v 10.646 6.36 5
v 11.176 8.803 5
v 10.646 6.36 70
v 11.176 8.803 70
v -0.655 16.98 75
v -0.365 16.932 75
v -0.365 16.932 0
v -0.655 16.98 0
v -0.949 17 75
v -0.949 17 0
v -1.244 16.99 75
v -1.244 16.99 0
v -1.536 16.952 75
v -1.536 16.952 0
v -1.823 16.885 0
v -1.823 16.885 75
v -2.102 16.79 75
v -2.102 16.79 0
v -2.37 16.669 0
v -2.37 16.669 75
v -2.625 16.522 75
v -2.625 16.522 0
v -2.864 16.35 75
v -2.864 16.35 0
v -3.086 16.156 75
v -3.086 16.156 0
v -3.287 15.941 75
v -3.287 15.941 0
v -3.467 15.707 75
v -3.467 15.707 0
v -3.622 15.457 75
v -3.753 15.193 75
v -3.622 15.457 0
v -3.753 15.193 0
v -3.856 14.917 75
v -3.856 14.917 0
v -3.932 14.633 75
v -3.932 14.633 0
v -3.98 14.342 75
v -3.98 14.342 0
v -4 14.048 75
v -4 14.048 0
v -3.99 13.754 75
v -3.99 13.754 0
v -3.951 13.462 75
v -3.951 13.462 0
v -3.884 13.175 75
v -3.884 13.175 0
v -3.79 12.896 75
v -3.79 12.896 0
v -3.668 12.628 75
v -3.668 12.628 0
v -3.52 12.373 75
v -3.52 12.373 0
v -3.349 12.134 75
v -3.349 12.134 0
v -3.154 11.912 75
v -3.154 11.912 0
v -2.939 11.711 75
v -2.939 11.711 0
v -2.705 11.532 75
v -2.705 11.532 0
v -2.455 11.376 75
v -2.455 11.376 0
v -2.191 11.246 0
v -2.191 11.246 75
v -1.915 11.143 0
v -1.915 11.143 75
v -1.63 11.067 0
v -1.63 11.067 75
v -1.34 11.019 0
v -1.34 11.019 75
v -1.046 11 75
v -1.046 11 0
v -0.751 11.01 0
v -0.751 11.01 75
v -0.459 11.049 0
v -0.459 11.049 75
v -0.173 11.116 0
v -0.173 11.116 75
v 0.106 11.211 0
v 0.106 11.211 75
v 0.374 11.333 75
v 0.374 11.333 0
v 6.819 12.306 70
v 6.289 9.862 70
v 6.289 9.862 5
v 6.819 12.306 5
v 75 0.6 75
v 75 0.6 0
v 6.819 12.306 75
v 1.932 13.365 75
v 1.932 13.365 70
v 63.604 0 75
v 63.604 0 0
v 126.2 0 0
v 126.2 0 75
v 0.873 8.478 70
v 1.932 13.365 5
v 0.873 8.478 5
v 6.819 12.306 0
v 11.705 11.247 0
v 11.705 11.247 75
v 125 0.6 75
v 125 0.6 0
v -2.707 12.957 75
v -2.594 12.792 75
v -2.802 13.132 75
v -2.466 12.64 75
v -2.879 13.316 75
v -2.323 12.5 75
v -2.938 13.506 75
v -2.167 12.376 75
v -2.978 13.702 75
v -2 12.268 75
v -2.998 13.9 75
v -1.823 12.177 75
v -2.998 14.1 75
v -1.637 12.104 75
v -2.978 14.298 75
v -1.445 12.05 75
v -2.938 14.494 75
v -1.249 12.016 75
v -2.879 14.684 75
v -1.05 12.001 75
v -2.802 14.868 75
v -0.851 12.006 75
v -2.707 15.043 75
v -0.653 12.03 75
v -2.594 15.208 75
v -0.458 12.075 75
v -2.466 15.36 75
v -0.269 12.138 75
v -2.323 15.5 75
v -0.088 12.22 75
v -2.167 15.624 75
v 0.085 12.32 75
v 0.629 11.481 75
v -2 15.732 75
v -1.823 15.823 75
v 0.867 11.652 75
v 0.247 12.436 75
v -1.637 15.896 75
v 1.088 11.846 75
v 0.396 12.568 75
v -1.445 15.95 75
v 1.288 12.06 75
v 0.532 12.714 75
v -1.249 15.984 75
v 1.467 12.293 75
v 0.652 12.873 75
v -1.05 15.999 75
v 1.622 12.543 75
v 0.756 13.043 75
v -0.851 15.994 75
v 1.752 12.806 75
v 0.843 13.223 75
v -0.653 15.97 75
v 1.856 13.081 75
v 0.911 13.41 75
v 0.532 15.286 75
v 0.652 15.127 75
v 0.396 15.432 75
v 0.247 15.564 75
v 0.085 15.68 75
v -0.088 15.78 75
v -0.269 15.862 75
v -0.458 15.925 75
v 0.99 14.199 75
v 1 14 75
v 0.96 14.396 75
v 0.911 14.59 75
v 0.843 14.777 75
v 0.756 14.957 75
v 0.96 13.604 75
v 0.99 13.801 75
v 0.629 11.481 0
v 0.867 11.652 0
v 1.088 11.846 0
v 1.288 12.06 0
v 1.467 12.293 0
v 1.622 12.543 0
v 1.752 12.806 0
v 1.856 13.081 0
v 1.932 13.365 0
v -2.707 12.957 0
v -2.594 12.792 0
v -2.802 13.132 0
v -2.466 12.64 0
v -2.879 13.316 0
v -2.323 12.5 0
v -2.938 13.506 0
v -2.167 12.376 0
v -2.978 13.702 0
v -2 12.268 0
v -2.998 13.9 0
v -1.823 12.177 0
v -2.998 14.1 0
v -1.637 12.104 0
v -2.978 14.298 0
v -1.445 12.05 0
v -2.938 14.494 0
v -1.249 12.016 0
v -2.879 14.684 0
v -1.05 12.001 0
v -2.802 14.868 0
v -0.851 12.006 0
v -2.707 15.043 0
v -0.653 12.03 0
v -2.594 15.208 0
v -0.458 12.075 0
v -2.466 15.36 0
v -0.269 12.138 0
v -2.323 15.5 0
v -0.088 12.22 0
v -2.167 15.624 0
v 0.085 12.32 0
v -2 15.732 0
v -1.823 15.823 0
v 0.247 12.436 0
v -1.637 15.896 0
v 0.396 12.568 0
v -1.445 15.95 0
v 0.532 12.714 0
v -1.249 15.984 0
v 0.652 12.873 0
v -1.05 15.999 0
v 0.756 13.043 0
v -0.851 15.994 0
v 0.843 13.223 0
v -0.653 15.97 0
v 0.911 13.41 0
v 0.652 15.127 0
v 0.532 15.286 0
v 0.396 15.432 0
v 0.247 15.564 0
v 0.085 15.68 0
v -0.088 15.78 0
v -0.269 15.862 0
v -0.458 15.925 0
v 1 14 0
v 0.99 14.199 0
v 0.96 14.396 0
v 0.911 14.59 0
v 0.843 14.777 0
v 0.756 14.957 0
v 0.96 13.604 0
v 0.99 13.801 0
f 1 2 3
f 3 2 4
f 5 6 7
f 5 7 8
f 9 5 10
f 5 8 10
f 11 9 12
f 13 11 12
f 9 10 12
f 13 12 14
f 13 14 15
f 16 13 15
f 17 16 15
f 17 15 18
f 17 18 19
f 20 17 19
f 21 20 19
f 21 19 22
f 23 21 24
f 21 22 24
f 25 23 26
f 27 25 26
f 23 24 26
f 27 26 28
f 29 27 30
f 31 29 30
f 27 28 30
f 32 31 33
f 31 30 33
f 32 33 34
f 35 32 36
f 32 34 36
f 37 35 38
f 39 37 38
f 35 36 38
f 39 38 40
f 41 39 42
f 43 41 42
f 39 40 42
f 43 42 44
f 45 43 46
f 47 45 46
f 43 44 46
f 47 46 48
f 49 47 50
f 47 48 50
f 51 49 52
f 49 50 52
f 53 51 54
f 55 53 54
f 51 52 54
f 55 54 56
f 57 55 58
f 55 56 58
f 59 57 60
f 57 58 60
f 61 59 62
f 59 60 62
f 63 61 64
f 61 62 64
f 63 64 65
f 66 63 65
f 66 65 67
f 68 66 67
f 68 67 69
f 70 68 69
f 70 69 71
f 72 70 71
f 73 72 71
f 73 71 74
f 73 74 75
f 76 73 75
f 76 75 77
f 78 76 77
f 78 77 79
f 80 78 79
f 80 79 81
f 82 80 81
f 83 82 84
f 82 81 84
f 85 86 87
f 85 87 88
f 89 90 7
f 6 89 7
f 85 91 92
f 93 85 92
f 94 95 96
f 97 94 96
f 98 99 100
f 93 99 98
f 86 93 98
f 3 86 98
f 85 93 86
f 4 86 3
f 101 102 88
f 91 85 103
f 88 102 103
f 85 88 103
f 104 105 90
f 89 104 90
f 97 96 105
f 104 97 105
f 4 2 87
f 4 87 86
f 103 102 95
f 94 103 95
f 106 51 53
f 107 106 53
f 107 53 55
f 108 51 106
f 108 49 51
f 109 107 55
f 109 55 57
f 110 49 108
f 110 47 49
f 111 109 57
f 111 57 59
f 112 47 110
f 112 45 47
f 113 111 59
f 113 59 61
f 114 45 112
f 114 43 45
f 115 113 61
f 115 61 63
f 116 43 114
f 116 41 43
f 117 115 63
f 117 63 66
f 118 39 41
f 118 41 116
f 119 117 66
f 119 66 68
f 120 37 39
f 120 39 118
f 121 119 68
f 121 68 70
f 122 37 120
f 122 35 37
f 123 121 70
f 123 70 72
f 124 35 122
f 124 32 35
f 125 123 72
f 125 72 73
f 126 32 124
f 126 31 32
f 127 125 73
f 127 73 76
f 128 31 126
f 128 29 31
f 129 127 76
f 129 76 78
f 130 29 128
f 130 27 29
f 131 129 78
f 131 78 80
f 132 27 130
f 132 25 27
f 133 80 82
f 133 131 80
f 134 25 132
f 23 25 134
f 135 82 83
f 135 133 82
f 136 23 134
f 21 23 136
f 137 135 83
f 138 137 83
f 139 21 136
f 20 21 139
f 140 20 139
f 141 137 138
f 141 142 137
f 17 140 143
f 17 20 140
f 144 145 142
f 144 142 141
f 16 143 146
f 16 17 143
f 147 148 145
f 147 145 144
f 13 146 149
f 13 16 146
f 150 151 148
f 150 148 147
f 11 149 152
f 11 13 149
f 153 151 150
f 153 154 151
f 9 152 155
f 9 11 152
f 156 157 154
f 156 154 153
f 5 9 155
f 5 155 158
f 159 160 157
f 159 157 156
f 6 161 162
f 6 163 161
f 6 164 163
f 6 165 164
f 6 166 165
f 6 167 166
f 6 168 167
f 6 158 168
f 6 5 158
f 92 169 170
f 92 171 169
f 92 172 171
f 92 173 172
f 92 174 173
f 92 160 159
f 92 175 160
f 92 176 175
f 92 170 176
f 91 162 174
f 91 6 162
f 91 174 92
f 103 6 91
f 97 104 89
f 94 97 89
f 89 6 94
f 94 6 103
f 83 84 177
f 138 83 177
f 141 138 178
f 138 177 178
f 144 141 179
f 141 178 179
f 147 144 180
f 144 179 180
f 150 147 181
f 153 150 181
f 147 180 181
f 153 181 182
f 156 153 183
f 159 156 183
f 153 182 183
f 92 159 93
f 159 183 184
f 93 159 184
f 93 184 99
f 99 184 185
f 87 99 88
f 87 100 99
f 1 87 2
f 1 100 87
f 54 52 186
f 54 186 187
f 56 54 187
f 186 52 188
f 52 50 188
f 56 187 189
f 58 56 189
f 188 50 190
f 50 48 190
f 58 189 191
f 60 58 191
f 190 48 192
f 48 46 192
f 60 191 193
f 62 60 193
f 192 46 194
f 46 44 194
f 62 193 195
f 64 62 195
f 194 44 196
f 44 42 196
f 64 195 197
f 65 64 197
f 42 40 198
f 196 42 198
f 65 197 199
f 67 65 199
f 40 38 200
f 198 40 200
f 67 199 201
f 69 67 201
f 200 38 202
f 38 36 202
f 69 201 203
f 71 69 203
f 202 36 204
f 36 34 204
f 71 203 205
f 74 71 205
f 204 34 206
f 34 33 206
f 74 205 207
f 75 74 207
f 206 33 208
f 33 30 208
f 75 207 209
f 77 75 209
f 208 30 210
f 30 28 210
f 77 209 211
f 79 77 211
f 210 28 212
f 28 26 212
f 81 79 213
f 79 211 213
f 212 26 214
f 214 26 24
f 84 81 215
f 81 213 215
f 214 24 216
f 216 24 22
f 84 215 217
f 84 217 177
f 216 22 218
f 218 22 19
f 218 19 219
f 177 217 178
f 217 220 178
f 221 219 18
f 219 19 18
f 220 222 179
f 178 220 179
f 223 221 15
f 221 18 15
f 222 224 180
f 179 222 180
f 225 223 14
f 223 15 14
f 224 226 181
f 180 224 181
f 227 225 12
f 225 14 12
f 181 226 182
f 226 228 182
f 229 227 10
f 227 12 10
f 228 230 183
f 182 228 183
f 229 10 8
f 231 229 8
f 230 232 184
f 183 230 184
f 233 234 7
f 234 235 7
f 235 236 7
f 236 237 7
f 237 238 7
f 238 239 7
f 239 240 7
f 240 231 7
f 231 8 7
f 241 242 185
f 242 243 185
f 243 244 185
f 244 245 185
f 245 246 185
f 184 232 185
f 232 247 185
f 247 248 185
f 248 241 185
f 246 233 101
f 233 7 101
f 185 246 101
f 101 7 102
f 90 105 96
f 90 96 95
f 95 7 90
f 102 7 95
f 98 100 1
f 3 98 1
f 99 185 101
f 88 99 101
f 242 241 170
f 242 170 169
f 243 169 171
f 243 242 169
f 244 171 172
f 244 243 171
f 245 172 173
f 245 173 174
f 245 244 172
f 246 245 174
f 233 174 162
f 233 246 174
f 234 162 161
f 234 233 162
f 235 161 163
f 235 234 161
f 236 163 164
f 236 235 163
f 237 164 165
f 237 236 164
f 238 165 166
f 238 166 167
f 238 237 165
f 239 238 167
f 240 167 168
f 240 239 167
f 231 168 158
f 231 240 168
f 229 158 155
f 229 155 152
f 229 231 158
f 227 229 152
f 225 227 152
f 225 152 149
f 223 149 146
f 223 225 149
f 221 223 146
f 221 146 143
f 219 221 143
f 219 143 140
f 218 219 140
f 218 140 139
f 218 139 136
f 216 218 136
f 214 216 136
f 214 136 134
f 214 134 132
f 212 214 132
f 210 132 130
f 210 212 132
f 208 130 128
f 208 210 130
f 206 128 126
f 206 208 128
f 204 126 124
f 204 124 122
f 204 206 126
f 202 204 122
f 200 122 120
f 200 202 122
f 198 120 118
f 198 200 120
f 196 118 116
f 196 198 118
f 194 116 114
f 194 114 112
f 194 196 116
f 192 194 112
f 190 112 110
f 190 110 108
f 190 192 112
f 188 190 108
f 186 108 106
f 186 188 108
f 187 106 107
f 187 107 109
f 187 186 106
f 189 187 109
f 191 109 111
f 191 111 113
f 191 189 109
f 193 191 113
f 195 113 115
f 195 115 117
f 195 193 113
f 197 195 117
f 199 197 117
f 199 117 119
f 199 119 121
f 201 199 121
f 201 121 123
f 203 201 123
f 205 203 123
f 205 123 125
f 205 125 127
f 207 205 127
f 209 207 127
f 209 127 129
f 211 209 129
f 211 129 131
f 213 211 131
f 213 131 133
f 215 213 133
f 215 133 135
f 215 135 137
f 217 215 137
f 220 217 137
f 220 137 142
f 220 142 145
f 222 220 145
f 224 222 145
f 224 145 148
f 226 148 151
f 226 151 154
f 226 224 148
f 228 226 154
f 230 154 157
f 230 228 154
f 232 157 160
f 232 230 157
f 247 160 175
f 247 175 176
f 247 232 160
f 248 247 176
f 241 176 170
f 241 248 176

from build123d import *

# Parameters (mm, degrees)
F0_R     = 2
F1_DEPTH = 75
F2_W     = 10
F2_H     = 75
F3_DEPTH = 5
F4_W     = 2.5
F4_H     = 75
F5_DEPTH = 5
F7_DEPTH = 5
F9_DEPTH = 5


with BuildPart() as f1:
    # F0 (on Top) → F1 (new body)
    with BuildSketch(Plane.XY):
        with BuildLine():
            Line((75, 0.6), (-0.3646306216, 16.9319457282))
            ThreePointArc((-0.3646306216, 16.9319457282), (-3.9741969781, 13.6073776176), (0.3744351102, 11.3333676429))
            ThreePointArc((0.3744351102, 11.3333676429), (1.3807008009, 12.1745510972), (1.9319457282, 13.3646306216))
            Line((1.9319457282, 13.3646306216), (63.6037432565, 0))
            Line((63.6037432565, 0), (75, 0))
            Line((75, 0), (76.2, 0))
            Line((76.2, 0), (125, 0))
            Line((125, 0), (126.2, 0))
            Line((126.2, 0), (125, 0.6))
            Line((125, 0.6), (75, 0.6))
        make_face()
        with Locations((-1, 14)):
            Circle(F0_R, mode=Mode.SUBTRACT)
    extrude(amount=F1_DEPTH)

    # F2 (on face) → F3 (join)
    with BuildSketch(Plane(origin=(2.8529405822, 13.1650457786, 0), x_dir=(0.9773152427, -0.2117897928, 0), z_dir=(-0.2117897928, -0.9773152427, 0))):
        with Locations((4.0576276581, 37.5)):
            Rectangle(F2_W, F2_H)
    extrude(amount=F3_DEPTH)

    # F4 (on face) → F5 (cut)
    with BuildSketch(Plane(origin=(8.8521575732, -1.9183130849, 0), x_dir=(0.2117897928, 0.9773152427, 0), z_dir=(0.9773152427, -0.2117897928, 0))):
        with Locations((12.2206236054, 37.5)):
            Rectangle(F4_W, F4_H)
    extrude(amount=-F5_DEPTH, mode=Mode.SUBTRACT)

    # F6 (on face) → F7 (cut)
    with BuildSketch(Plane.XY.offset(75)):
        Polygon((6.2890474598, 9.8623935508), (6.8185219418, 12.3056816576), (1.9319457282, 13.3646306216), (0.8729967642, 8.478054408), (10.6461491915, 6.36015648), (11.1756236735, 8.8034445868), align=None)
    extrude(amount=-F7_DEPTH, mode=Mode.SUBTRACT)

    # F8 (on face) → F9 (cut)
    with BuildSketch(Plane(origin=(0, 0, 0), x_dir=(1, 0, 0), z_dir=(0, 0, -1))):
        Polygon((1.9319457282, -13.3646306216), (6.8185219418, -12.3056816576), (6.2890474598, -9.8623935508), (11.1756236735, -8.8034445868), (10.6461491915, -6.36015648), (0.8729967642, -8.478054408), align=None)
    extrude(amount=-F9_DEPTH, mode=Mode.SUBTRACT)


solid = f1.part
